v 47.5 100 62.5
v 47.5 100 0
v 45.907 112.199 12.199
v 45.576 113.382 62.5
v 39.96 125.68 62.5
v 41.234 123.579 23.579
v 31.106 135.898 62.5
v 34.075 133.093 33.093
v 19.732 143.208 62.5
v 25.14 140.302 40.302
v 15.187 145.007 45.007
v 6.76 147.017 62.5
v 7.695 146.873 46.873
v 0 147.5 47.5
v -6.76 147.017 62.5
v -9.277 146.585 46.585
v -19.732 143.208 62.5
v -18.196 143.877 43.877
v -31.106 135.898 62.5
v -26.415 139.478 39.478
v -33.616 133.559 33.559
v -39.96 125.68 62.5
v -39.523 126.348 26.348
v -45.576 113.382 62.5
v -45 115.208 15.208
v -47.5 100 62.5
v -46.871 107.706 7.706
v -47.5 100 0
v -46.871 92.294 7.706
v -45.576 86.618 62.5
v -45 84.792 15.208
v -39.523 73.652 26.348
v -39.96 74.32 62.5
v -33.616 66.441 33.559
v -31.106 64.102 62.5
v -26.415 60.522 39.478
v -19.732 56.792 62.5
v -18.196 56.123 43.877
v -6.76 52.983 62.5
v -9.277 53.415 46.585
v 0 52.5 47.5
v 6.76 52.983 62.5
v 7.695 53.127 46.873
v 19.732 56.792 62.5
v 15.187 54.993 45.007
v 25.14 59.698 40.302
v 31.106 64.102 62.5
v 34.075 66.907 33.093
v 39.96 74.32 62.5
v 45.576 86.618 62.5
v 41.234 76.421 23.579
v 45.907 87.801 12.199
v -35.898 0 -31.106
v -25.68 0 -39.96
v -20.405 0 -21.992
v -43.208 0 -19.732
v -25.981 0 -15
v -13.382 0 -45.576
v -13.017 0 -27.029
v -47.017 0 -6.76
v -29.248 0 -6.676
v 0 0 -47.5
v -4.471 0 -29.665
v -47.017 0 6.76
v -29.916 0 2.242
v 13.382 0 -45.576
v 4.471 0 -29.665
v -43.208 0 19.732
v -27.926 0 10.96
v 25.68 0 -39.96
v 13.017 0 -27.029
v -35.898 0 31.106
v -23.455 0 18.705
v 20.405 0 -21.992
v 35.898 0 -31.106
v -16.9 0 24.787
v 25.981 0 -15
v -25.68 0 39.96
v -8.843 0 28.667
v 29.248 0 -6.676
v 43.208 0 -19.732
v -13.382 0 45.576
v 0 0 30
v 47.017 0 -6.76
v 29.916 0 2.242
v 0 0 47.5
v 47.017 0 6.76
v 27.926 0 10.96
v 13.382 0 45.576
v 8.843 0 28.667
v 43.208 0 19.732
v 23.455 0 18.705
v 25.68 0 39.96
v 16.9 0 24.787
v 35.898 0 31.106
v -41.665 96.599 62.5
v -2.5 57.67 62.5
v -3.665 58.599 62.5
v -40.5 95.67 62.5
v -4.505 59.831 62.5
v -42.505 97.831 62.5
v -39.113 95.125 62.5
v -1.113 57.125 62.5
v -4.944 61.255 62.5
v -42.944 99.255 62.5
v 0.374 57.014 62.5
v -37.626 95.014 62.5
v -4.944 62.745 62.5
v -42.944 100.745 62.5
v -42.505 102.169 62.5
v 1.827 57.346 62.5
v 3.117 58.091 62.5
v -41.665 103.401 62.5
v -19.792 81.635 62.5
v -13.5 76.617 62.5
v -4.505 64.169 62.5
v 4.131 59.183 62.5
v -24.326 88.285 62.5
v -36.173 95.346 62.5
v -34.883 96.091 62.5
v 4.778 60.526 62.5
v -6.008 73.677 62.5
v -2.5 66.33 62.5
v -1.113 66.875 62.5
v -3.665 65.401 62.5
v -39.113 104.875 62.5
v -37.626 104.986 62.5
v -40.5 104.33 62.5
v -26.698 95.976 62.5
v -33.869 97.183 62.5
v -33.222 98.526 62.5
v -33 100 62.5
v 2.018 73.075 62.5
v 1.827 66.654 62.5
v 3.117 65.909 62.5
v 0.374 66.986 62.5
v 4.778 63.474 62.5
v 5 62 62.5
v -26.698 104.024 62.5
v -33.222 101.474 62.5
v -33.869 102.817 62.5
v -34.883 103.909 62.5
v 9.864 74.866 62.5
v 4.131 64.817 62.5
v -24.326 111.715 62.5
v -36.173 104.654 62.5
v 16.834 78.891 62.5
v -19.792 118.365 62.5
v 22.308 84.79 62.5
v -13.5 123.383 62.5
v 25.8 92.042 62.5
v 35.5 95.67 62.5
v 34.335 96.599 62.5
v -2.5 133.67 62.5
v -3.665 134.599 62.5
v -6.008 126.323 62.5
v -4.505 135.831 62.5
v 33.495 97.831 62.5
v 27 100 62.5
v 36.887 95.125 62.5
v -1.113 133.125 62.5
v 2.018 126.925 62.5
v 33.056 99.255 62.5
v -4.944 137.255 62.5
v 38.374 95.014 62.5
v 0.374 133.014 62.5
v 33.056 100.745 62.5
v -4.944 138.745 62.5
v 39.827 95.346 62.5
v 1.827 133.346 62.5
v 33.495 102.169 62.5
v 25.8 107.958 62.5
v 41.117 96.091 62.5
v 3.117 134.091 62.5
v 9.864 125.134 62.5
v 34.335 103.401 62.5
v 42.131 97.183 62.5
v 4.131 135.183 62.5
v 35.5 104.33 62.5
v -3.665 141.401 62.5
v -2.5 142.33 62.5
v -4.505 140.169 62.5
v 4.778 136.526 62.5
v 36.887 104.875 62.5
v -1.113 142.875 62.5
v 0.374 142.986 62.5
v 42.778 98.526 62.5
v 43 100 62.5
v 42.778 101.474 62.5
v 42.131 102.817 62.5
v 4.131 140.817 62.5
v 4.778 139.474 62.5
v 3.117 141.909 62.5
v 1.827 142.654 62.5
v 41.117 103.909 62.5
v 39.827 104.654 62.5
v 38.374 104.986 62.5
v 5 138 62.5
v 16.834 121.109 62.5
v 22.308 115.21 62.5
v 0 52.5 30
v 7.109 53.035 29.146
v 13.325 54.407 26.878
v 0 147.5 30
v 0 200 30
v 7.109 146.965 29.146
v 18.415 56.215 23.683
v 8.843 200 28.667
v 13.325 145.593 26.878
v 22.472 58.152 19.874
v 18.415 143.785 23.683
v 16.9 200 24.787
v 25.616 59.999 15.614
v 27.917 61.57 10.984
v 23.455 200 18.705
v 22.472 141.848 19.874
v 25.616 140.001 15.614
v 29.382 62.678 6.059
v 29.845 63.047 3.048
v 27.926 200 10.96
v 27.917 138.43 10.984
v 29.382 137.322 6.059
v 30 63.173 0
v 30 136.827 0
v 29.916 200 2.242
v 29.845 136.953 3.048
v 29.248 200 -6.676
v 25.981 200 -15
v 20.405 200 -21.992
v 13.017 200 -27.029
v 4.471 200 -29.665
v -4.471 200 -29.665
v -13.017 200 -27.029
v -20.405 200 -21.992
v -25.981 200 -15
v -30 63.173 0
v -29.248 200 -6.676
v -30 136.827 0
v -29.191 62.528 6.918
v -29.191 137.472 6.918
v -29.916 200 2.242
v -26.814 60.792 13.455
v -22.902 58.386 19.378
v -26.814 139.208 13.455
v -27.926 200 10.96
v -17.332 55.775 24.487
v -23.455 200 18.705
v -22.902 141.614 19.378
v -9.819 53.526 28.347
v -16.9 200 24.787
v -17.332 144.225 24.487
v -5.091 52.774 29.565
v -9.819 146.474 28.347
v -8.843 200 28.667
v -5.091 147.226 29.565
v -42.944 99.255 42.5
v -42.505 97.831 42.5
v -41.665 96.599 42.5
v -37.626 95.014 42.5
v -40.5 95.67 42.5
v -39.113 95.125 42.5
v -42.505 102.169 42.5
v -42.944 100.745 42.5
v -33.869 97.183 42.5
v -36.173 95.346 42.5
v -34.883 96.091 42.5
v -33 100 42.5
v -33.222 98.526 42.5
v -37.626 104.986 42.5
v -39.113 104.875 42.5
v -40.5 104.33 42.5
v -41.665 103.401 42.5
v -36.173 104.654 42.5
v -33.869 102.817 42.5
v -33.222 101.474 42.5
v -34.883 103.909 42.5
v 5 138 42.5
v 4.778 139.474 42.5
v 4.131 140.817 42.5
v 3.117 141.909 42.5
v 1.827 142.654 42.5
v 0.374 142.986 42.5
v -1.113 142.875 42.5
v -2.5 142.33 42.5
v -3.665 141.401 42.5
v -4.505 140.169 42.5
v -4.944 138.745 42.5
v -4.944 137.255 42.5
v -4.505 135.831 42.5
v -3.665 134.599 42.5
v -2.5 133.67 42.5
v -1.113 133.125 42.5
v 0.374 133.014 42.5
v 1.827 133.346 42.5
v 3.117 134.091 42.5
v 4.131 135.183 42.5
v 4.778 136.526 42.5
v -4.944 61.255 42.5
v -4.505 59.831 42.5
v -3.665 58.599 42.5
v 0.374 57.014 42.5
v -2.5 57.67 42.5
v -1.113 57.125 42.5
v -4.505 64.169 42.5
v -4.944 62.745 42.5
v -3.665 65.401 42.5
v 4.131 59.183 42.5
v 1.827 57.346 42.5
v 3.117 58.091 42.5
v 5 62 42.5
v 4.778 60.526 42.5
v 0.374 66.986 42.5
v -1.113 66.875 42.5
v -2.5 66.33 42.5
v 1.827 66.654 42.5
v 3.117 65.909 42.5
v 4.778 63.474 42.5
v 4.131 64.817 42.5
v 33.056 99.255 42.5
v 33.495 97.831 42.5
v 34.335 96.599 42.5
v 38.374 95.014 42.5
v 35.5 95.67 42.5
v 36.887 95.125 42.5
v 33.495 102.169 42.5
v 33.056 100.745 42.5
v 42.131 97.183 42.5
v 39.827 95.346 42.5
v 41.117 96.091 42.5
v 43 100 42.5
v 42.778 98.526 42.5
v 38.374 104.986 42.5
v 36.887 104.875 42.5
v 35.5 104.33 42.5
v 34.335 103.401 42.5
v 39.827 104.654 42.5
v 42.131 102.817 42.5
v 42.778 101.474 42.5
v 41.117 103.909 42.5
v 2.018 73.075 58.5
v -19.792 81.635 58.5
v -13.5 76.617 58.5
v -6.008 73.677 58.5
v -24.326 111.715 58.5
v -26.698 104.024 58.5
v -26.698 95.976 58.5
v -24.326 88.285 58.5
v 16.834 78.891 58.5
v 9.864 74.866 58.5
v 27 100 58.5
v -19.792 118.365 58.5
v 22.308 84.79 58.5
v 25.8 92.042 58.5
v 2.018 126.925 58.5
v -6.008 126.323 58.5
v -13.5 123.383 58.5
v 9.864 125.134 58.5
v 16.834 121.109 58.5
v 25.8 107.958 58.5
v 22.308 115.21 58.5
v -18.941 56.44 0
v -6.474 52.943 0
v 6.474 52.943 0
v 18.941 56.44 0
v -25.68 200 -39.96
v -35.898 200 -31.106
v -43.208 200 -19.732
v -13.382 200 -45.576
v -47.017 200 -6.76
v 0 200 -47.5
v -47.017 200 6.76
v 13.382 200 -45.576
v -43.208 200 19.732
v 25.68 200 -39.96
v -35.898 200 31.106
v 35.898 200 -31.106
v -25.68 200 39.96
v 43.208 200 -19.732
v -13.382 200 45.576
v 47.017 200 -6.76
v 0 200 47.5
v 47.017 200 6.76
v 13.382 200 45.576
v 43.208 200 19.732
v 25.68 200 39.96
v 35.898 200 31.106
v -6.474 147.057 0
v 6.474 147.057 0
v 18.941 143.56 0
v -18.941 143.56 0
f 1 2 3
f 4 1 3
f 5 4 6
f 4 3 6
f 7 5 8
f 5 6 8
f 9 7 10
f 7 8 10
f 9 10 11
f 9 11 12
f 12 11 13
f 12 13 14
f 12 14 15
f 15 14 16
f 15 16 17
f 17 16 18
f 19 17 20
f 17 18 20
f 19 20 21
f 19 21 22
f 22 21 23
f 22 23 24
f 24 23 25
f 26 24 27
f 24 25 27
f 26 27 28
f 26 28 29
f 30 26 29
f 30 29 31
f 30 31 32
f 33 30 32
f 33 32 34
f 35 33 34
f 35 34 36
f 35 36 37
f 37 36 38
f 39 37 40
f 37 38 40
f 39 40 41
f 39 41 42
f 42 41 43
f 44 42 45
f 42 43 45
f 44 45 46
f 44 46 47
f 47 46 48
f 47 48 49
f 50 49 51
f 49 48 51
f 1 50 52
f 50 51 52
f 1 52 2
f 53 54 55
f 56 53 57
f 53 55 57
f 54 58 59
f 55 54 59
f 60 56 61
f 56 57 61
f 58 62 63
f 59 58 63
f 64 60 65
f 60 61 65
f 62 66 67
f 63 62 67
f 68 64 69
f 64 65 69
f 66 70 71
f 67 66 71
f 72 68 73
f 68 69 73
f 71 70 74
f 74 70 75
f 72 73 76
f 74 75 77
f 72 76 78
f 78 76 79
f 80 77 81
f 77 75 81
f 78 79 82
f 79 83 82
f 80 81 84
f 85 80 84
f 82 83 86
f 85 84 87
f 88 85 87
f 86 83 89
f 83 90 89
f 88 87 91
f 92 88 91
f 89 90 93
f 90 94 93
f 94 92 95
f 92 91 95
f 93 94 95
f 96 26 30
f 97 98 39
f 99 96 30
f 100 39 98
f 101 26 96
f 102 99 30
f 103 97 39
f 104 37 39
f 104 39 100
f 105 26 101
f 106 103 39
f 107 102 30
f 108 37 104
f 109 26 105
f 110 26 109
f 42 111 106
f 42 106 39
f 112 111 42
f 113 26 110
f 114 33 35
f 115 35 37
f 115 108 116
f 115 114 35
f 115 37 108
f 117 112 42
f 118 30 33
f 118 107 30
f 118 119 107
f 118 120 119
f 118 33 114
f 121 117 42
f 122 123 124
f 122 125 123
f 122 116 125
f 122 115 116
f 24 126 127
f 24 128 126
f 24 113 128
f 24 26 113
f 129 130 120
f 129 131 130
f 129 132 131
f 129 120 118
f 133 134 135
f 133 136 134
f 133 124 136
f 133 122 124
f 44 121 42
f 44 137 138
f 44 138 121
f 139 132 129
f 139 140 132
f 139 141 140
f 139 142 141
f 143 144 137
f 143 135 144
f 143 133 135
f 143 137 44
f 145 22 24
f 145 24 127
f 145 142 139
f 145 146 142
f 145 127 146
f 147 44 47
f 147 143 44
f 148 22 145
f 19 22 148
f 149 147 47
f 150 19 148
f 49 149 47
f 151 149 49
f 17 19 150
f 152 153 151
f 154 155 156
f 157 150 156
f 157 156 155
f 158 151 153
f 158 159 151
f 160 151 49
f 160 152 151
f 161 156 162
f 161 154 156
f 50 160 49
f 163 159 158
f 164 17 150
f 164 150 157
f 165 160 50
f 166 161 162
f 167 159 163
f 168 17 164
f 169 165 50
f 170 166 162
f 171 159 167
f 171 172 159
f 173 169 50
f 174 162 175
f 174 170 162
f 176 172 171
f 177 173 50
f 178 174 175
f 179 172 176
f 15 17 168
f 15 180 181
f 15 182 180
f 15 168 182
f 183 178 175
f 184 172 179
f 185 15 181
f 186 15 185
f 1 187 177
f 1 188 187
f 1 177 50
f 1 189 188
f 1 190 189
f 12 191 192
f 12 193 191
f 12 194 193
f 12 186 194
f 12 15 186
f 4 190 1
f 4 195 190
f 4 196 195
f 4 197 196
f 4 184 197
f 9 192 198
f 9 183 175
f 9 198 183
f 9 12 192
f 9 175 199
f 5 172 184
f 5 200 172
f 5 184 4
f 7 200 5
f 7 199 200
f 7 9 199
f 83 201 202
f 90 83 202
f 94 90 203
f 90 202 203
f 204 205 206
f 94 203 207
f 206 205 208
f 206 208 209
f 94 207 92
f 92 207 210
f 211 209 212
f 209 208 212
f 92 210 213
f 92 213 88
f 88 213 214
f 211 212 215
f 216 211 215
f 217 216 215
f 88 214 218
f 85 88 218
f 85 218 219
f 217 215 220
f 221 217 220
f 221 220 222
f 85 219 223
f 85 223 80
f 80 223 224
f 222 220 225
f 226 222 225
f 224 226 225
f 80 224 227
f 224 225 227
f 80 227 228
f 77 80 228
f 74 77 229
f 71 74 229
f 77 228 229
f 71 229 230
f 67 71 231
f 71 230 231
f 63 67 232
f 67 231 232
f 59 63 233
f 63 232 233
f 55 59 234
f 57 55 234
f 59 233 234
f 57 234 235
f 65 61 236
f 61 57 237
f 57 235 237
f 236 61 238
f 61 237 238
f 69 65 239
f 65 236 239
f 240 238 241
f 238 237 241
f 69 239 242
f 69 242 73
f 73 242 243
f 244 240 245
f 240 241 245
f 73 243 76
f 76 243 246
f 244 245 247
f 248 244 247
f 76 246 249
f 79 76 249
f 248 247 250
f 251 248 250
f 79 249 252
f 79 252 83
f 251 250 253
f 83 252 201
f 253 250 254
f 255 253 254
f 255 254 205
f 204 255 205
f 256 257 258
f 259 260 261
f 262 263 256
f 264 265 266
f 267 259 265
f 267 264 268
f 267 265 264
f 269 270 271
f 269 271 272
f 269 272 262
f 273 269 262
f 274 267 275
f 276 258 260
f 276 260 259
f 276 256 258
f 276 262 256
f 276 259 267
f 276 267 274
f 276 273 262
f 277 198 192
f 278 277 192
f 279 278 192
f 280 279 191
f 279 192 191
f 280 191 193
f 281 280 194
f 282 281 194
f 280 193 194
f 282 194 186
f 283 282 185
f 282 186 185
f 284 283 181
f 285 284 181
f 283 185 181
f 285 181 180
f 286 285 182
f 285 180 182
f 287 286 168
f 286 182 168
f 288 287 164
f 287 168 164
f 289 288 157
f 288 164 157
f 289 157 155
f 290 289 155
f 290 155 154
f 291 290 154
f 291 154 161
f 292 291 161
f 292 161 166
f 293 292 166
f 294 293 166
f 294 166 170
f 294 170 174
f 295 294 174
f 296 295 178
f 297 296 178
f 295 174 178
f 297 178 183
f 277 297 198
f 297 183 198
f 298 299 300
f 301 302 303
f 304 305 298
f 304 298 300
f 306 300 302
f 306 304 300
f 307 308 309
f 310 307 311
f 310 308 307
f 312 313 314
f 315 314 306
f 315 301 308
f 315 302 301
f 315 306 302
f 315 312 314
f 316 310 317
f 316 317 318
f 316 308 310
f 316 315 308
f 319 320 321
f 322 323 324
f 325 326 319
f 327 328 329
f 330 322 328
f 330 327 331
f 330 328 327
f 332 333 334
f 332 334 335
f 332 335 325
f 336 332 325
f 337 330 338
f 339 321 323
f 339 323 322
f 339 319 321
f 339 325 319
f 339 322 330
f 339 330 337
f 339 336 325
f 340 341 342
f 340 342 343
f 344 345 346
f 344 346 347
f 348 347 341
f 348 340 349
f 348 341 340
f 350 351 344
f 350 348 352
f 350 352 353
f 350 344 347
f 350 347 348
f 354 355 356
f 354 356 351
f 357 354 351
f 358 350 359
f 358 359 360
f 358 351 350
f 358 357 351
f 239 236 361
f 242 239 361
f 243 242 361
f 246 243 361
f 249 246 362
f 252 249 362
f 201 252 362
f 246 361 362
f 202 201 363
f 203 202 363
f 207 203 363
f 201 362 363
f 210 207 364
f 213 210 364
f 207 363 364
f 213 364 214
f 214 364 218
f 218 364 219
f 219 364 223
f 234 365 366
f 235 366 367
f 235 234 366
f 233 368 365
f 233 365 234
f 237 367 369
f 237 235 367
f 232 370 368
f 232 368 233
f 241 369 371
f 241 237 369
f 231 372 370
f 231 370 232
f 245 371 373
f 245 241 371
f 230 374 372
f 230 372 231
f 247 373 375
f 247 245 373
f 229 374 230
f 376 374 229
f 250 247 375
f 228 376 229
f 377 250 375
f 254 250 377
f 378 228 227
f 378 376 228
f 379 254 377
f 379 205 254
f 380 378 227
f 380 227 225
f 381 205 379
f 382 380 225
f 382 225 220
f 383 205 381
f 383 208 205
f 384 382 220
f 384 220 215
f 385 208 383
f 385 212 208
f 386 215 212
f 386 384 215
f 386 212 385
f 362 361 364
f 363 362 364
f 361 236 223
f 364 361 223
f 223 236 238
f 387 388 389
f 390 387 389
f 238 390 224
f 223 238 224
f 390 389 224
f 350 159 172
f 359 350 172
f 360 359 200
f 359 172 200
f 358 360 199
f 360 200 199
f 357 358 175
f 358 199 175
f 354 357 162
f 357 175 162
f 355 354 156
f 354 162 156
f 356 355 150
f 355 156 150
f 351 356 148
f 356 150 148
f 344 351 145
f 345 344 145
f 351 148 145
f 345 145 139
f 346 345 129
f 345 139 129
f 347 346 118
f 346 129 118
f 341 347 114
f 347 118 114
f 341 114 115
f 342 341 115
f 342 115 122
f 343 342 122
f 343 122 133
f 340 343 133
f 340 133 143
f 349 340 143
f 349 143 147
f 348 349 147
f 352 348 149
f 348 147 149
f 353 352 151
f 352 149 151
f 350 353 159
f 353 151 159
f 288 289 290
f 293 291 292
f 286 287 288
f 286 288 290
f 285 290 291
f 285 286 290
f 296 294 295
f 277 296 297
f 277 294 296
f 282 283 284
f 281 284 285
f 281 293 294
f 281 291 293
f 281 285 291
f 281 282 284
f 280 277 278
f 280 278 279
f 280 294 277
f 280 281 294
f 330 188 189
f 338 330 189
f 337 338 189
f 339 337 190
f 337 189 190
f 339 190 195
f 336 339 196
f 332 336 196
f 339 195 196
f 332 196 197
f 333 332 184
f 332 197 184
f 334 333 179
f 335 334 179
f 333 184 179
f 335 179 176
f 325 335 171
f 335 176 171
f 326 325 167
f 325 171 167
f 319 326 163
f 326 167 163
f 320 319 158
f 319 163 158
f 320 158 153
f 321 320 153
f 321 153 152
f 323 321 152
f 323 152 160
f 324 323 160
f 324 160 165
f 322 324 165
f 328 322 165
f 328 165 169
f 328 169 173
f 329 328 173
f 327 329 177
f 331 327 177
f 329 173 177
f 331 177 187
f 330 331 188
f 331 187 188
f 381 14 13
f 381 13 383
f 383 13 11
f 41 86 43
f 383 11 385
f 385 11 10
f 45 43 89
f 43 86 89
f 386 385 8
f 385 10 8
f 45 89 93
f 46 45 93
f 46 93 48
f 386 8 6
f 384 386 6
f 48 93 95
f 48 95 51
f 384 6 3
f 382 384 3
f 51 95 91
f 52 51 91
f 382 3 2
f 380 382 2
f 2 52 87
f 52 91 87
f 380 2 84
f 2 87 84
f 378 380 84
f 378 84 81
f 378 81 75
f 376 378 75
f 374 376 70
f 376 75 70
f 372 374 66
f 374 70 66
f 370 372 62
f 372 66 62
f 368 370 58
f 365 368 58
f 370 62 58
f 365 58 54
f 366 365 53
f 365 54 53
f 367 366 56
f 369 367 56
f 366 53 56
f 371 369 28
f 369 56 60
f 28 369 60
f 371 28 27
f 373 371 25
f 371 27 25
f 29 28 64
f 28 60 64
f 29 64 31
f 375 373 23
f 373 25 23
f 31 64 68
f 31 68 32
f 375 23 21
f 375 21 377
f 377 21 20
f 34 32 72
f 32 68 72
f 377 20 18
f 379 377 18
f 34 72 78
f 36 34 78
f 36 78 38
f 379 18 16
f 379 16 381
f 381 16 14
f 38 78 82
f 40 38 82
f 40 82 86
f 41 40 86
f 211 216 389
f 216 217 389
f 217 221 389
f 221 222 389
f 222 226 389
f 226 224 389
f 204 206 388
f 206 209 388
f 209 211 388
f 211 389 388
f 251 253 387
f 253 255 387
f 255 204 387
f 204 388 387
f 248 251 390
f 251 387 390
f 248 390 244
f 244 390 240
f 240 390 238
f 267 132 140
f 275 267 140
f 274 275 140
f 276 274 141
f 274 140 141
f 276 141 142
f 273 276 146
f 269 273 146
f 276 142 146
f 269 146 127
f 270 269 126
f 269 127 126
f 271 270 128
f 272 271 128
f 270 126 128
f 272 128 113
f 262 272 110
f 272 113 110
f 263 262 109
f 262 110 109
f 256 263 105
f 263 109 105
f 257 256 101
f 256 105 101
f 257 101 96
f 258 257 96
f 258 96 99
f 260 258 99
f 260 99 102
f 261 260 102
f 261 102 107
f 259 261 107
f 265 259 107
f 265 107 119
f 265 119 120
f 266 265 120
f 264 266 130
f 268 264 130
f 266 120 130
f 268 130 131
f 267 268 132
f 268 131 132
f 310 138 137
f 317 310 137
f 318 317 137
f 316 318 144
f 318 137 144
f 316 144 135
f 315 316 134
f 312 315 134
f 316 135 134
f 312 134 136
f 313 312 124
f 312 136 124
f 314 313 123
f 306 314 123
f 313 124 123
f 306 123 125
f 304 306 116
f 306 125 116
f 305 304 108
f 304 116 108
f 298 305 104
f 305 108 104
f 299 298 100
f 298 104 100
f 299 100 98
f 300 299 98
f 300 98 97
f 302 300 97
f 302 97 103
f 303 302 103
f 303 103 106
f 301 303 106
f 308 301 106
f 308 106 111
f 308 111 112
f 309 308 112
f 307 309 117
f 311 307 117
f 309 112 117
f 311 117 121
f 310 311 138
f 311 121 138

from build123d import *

# Parameters (mm, degrees)
SKETCH1_R           = 47.5
BOSS_EXTRUDE1_DEPTH = 200
SKETCH2_R           = 30
CUT_EXTRUDE2_DEPTH  = 200
SKETCH4_R           = 47.5
BOSS_EXTRUDE2_DEPTH = 62.5
SKETCH5_R           = 5
CUT_EXTRUDE3_DEPTH  = 20
SKETCH6_R           = 27
CUT_EXTRUDE4_DEPTH  = 4


with BuildPart() as part:
    # Sketch1 → Boss-Extrude1 (new body)
    with BuildSketch(Plane(origin=(0, 0, 0), x_dir=(1, 0, 0), z_dir=(0, 1, 0))):
        with Locations(Location((0, 0, 0), (0, 0, 270))):
            Circle(SKETCH1_R)
    extrude(amount=BOSS_EXTRUDE1_DEPTH)

    # Sketch2 → Cut-Extrude2 (cut)
    with BuildSketch(Plane(origin=(0, 200, 0), x_dir=(1, 0, 0), z_dir=(0, 1, 0))):
        with Locations(Location((0, 0, 0), (0, 0, 270))):
            Circle(SKETCH2_R)
    extrude(amount=-CUT_EXTRUDE2_DEPTH, mode=Mode.SUBTRACT)

    # Sketch4 → Boss-Extrude2 (add)
    with BuildSketch(Plane.XY):
        with Locations((0, 100)):
            Circle(SKETCH4_R)
    extrude(amount=BOSS_EXTRUDE2_DEPTH)

    # Sketch5 → Cut-Extrude3 (cut)
    with BuildSketch(Plane.XY.offset(62.5)):
        with Locations((0, 138)):
            Circle(SKETCH5_R)
        with Locations((0, 62)):
            Circle(SKETCH5_R)
        with Locations((38, 100)):
            Circle(SKETCH5_R)
        with Locations((-38, 100)):
            Circle(SKETCH5_R)
    extrude(amount=-CUT_EXTRUDE3_DEPTH, mode=Mode.SUBTRACT)

    # Sketch6 → Cut-Extrude4 (cut)
    with BuildSketch(Plane.XY.offset(62.5)):
        with Locations((0, 100)):
            Circle(SKETCH6_R)
    extrude(amount=-CUT_EXTRUDE4_DEPTH, mode=Mode.SUBTRACT)


solid = part.part
